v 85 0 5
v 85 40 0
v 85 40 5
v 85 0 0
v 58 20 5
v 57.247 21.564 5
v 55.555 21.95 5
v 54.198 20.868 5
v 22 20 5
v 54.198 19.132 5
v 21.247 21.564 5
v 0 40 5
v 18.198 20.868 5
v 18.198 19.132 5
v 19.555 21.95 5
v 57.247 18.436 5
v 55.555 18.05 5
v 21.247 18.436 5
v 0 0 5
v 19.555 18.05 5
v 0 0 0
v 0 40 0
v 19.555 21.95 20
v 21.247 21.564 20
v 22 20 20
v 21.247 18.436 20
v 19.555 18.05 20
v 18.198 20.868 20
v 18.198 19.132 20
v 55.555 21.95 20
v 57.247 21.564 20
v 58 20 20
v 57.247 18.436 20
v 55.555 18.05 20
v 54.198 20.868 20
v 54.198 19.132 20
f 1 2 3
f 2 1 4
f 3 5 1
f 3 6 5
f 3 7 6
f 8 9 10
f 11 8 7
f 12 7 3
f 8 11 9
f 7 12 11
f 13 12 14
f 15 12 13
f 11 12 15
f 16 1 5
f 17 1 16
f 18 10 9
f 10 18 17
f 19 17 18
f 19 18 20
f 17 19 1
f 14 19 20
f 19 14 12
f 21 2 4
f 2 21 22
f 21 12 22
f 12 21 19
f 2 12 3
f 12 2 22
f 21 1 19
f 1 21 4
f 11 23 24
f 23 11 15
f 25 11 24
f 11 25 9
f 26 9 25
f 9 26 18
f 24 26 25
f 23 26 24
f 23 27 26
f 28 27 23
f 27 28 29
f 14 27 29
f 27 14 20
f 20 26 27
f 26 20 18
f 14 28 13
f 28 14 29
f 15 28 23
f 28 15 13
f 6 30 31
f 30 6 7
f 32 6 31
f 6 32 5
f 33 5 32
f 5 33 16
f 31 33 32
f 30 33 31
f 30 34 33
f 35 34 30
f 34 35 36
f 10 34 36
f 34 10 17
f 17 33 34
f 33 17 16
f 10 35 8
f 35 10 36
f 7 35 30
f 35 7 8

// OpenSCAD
cube(size=[85, 40, 5]);

translate([20, 20, 5]) cylinder(h= 15, r=2);

translate([56,20, 5]) cylinder(h= 15, r=2);
